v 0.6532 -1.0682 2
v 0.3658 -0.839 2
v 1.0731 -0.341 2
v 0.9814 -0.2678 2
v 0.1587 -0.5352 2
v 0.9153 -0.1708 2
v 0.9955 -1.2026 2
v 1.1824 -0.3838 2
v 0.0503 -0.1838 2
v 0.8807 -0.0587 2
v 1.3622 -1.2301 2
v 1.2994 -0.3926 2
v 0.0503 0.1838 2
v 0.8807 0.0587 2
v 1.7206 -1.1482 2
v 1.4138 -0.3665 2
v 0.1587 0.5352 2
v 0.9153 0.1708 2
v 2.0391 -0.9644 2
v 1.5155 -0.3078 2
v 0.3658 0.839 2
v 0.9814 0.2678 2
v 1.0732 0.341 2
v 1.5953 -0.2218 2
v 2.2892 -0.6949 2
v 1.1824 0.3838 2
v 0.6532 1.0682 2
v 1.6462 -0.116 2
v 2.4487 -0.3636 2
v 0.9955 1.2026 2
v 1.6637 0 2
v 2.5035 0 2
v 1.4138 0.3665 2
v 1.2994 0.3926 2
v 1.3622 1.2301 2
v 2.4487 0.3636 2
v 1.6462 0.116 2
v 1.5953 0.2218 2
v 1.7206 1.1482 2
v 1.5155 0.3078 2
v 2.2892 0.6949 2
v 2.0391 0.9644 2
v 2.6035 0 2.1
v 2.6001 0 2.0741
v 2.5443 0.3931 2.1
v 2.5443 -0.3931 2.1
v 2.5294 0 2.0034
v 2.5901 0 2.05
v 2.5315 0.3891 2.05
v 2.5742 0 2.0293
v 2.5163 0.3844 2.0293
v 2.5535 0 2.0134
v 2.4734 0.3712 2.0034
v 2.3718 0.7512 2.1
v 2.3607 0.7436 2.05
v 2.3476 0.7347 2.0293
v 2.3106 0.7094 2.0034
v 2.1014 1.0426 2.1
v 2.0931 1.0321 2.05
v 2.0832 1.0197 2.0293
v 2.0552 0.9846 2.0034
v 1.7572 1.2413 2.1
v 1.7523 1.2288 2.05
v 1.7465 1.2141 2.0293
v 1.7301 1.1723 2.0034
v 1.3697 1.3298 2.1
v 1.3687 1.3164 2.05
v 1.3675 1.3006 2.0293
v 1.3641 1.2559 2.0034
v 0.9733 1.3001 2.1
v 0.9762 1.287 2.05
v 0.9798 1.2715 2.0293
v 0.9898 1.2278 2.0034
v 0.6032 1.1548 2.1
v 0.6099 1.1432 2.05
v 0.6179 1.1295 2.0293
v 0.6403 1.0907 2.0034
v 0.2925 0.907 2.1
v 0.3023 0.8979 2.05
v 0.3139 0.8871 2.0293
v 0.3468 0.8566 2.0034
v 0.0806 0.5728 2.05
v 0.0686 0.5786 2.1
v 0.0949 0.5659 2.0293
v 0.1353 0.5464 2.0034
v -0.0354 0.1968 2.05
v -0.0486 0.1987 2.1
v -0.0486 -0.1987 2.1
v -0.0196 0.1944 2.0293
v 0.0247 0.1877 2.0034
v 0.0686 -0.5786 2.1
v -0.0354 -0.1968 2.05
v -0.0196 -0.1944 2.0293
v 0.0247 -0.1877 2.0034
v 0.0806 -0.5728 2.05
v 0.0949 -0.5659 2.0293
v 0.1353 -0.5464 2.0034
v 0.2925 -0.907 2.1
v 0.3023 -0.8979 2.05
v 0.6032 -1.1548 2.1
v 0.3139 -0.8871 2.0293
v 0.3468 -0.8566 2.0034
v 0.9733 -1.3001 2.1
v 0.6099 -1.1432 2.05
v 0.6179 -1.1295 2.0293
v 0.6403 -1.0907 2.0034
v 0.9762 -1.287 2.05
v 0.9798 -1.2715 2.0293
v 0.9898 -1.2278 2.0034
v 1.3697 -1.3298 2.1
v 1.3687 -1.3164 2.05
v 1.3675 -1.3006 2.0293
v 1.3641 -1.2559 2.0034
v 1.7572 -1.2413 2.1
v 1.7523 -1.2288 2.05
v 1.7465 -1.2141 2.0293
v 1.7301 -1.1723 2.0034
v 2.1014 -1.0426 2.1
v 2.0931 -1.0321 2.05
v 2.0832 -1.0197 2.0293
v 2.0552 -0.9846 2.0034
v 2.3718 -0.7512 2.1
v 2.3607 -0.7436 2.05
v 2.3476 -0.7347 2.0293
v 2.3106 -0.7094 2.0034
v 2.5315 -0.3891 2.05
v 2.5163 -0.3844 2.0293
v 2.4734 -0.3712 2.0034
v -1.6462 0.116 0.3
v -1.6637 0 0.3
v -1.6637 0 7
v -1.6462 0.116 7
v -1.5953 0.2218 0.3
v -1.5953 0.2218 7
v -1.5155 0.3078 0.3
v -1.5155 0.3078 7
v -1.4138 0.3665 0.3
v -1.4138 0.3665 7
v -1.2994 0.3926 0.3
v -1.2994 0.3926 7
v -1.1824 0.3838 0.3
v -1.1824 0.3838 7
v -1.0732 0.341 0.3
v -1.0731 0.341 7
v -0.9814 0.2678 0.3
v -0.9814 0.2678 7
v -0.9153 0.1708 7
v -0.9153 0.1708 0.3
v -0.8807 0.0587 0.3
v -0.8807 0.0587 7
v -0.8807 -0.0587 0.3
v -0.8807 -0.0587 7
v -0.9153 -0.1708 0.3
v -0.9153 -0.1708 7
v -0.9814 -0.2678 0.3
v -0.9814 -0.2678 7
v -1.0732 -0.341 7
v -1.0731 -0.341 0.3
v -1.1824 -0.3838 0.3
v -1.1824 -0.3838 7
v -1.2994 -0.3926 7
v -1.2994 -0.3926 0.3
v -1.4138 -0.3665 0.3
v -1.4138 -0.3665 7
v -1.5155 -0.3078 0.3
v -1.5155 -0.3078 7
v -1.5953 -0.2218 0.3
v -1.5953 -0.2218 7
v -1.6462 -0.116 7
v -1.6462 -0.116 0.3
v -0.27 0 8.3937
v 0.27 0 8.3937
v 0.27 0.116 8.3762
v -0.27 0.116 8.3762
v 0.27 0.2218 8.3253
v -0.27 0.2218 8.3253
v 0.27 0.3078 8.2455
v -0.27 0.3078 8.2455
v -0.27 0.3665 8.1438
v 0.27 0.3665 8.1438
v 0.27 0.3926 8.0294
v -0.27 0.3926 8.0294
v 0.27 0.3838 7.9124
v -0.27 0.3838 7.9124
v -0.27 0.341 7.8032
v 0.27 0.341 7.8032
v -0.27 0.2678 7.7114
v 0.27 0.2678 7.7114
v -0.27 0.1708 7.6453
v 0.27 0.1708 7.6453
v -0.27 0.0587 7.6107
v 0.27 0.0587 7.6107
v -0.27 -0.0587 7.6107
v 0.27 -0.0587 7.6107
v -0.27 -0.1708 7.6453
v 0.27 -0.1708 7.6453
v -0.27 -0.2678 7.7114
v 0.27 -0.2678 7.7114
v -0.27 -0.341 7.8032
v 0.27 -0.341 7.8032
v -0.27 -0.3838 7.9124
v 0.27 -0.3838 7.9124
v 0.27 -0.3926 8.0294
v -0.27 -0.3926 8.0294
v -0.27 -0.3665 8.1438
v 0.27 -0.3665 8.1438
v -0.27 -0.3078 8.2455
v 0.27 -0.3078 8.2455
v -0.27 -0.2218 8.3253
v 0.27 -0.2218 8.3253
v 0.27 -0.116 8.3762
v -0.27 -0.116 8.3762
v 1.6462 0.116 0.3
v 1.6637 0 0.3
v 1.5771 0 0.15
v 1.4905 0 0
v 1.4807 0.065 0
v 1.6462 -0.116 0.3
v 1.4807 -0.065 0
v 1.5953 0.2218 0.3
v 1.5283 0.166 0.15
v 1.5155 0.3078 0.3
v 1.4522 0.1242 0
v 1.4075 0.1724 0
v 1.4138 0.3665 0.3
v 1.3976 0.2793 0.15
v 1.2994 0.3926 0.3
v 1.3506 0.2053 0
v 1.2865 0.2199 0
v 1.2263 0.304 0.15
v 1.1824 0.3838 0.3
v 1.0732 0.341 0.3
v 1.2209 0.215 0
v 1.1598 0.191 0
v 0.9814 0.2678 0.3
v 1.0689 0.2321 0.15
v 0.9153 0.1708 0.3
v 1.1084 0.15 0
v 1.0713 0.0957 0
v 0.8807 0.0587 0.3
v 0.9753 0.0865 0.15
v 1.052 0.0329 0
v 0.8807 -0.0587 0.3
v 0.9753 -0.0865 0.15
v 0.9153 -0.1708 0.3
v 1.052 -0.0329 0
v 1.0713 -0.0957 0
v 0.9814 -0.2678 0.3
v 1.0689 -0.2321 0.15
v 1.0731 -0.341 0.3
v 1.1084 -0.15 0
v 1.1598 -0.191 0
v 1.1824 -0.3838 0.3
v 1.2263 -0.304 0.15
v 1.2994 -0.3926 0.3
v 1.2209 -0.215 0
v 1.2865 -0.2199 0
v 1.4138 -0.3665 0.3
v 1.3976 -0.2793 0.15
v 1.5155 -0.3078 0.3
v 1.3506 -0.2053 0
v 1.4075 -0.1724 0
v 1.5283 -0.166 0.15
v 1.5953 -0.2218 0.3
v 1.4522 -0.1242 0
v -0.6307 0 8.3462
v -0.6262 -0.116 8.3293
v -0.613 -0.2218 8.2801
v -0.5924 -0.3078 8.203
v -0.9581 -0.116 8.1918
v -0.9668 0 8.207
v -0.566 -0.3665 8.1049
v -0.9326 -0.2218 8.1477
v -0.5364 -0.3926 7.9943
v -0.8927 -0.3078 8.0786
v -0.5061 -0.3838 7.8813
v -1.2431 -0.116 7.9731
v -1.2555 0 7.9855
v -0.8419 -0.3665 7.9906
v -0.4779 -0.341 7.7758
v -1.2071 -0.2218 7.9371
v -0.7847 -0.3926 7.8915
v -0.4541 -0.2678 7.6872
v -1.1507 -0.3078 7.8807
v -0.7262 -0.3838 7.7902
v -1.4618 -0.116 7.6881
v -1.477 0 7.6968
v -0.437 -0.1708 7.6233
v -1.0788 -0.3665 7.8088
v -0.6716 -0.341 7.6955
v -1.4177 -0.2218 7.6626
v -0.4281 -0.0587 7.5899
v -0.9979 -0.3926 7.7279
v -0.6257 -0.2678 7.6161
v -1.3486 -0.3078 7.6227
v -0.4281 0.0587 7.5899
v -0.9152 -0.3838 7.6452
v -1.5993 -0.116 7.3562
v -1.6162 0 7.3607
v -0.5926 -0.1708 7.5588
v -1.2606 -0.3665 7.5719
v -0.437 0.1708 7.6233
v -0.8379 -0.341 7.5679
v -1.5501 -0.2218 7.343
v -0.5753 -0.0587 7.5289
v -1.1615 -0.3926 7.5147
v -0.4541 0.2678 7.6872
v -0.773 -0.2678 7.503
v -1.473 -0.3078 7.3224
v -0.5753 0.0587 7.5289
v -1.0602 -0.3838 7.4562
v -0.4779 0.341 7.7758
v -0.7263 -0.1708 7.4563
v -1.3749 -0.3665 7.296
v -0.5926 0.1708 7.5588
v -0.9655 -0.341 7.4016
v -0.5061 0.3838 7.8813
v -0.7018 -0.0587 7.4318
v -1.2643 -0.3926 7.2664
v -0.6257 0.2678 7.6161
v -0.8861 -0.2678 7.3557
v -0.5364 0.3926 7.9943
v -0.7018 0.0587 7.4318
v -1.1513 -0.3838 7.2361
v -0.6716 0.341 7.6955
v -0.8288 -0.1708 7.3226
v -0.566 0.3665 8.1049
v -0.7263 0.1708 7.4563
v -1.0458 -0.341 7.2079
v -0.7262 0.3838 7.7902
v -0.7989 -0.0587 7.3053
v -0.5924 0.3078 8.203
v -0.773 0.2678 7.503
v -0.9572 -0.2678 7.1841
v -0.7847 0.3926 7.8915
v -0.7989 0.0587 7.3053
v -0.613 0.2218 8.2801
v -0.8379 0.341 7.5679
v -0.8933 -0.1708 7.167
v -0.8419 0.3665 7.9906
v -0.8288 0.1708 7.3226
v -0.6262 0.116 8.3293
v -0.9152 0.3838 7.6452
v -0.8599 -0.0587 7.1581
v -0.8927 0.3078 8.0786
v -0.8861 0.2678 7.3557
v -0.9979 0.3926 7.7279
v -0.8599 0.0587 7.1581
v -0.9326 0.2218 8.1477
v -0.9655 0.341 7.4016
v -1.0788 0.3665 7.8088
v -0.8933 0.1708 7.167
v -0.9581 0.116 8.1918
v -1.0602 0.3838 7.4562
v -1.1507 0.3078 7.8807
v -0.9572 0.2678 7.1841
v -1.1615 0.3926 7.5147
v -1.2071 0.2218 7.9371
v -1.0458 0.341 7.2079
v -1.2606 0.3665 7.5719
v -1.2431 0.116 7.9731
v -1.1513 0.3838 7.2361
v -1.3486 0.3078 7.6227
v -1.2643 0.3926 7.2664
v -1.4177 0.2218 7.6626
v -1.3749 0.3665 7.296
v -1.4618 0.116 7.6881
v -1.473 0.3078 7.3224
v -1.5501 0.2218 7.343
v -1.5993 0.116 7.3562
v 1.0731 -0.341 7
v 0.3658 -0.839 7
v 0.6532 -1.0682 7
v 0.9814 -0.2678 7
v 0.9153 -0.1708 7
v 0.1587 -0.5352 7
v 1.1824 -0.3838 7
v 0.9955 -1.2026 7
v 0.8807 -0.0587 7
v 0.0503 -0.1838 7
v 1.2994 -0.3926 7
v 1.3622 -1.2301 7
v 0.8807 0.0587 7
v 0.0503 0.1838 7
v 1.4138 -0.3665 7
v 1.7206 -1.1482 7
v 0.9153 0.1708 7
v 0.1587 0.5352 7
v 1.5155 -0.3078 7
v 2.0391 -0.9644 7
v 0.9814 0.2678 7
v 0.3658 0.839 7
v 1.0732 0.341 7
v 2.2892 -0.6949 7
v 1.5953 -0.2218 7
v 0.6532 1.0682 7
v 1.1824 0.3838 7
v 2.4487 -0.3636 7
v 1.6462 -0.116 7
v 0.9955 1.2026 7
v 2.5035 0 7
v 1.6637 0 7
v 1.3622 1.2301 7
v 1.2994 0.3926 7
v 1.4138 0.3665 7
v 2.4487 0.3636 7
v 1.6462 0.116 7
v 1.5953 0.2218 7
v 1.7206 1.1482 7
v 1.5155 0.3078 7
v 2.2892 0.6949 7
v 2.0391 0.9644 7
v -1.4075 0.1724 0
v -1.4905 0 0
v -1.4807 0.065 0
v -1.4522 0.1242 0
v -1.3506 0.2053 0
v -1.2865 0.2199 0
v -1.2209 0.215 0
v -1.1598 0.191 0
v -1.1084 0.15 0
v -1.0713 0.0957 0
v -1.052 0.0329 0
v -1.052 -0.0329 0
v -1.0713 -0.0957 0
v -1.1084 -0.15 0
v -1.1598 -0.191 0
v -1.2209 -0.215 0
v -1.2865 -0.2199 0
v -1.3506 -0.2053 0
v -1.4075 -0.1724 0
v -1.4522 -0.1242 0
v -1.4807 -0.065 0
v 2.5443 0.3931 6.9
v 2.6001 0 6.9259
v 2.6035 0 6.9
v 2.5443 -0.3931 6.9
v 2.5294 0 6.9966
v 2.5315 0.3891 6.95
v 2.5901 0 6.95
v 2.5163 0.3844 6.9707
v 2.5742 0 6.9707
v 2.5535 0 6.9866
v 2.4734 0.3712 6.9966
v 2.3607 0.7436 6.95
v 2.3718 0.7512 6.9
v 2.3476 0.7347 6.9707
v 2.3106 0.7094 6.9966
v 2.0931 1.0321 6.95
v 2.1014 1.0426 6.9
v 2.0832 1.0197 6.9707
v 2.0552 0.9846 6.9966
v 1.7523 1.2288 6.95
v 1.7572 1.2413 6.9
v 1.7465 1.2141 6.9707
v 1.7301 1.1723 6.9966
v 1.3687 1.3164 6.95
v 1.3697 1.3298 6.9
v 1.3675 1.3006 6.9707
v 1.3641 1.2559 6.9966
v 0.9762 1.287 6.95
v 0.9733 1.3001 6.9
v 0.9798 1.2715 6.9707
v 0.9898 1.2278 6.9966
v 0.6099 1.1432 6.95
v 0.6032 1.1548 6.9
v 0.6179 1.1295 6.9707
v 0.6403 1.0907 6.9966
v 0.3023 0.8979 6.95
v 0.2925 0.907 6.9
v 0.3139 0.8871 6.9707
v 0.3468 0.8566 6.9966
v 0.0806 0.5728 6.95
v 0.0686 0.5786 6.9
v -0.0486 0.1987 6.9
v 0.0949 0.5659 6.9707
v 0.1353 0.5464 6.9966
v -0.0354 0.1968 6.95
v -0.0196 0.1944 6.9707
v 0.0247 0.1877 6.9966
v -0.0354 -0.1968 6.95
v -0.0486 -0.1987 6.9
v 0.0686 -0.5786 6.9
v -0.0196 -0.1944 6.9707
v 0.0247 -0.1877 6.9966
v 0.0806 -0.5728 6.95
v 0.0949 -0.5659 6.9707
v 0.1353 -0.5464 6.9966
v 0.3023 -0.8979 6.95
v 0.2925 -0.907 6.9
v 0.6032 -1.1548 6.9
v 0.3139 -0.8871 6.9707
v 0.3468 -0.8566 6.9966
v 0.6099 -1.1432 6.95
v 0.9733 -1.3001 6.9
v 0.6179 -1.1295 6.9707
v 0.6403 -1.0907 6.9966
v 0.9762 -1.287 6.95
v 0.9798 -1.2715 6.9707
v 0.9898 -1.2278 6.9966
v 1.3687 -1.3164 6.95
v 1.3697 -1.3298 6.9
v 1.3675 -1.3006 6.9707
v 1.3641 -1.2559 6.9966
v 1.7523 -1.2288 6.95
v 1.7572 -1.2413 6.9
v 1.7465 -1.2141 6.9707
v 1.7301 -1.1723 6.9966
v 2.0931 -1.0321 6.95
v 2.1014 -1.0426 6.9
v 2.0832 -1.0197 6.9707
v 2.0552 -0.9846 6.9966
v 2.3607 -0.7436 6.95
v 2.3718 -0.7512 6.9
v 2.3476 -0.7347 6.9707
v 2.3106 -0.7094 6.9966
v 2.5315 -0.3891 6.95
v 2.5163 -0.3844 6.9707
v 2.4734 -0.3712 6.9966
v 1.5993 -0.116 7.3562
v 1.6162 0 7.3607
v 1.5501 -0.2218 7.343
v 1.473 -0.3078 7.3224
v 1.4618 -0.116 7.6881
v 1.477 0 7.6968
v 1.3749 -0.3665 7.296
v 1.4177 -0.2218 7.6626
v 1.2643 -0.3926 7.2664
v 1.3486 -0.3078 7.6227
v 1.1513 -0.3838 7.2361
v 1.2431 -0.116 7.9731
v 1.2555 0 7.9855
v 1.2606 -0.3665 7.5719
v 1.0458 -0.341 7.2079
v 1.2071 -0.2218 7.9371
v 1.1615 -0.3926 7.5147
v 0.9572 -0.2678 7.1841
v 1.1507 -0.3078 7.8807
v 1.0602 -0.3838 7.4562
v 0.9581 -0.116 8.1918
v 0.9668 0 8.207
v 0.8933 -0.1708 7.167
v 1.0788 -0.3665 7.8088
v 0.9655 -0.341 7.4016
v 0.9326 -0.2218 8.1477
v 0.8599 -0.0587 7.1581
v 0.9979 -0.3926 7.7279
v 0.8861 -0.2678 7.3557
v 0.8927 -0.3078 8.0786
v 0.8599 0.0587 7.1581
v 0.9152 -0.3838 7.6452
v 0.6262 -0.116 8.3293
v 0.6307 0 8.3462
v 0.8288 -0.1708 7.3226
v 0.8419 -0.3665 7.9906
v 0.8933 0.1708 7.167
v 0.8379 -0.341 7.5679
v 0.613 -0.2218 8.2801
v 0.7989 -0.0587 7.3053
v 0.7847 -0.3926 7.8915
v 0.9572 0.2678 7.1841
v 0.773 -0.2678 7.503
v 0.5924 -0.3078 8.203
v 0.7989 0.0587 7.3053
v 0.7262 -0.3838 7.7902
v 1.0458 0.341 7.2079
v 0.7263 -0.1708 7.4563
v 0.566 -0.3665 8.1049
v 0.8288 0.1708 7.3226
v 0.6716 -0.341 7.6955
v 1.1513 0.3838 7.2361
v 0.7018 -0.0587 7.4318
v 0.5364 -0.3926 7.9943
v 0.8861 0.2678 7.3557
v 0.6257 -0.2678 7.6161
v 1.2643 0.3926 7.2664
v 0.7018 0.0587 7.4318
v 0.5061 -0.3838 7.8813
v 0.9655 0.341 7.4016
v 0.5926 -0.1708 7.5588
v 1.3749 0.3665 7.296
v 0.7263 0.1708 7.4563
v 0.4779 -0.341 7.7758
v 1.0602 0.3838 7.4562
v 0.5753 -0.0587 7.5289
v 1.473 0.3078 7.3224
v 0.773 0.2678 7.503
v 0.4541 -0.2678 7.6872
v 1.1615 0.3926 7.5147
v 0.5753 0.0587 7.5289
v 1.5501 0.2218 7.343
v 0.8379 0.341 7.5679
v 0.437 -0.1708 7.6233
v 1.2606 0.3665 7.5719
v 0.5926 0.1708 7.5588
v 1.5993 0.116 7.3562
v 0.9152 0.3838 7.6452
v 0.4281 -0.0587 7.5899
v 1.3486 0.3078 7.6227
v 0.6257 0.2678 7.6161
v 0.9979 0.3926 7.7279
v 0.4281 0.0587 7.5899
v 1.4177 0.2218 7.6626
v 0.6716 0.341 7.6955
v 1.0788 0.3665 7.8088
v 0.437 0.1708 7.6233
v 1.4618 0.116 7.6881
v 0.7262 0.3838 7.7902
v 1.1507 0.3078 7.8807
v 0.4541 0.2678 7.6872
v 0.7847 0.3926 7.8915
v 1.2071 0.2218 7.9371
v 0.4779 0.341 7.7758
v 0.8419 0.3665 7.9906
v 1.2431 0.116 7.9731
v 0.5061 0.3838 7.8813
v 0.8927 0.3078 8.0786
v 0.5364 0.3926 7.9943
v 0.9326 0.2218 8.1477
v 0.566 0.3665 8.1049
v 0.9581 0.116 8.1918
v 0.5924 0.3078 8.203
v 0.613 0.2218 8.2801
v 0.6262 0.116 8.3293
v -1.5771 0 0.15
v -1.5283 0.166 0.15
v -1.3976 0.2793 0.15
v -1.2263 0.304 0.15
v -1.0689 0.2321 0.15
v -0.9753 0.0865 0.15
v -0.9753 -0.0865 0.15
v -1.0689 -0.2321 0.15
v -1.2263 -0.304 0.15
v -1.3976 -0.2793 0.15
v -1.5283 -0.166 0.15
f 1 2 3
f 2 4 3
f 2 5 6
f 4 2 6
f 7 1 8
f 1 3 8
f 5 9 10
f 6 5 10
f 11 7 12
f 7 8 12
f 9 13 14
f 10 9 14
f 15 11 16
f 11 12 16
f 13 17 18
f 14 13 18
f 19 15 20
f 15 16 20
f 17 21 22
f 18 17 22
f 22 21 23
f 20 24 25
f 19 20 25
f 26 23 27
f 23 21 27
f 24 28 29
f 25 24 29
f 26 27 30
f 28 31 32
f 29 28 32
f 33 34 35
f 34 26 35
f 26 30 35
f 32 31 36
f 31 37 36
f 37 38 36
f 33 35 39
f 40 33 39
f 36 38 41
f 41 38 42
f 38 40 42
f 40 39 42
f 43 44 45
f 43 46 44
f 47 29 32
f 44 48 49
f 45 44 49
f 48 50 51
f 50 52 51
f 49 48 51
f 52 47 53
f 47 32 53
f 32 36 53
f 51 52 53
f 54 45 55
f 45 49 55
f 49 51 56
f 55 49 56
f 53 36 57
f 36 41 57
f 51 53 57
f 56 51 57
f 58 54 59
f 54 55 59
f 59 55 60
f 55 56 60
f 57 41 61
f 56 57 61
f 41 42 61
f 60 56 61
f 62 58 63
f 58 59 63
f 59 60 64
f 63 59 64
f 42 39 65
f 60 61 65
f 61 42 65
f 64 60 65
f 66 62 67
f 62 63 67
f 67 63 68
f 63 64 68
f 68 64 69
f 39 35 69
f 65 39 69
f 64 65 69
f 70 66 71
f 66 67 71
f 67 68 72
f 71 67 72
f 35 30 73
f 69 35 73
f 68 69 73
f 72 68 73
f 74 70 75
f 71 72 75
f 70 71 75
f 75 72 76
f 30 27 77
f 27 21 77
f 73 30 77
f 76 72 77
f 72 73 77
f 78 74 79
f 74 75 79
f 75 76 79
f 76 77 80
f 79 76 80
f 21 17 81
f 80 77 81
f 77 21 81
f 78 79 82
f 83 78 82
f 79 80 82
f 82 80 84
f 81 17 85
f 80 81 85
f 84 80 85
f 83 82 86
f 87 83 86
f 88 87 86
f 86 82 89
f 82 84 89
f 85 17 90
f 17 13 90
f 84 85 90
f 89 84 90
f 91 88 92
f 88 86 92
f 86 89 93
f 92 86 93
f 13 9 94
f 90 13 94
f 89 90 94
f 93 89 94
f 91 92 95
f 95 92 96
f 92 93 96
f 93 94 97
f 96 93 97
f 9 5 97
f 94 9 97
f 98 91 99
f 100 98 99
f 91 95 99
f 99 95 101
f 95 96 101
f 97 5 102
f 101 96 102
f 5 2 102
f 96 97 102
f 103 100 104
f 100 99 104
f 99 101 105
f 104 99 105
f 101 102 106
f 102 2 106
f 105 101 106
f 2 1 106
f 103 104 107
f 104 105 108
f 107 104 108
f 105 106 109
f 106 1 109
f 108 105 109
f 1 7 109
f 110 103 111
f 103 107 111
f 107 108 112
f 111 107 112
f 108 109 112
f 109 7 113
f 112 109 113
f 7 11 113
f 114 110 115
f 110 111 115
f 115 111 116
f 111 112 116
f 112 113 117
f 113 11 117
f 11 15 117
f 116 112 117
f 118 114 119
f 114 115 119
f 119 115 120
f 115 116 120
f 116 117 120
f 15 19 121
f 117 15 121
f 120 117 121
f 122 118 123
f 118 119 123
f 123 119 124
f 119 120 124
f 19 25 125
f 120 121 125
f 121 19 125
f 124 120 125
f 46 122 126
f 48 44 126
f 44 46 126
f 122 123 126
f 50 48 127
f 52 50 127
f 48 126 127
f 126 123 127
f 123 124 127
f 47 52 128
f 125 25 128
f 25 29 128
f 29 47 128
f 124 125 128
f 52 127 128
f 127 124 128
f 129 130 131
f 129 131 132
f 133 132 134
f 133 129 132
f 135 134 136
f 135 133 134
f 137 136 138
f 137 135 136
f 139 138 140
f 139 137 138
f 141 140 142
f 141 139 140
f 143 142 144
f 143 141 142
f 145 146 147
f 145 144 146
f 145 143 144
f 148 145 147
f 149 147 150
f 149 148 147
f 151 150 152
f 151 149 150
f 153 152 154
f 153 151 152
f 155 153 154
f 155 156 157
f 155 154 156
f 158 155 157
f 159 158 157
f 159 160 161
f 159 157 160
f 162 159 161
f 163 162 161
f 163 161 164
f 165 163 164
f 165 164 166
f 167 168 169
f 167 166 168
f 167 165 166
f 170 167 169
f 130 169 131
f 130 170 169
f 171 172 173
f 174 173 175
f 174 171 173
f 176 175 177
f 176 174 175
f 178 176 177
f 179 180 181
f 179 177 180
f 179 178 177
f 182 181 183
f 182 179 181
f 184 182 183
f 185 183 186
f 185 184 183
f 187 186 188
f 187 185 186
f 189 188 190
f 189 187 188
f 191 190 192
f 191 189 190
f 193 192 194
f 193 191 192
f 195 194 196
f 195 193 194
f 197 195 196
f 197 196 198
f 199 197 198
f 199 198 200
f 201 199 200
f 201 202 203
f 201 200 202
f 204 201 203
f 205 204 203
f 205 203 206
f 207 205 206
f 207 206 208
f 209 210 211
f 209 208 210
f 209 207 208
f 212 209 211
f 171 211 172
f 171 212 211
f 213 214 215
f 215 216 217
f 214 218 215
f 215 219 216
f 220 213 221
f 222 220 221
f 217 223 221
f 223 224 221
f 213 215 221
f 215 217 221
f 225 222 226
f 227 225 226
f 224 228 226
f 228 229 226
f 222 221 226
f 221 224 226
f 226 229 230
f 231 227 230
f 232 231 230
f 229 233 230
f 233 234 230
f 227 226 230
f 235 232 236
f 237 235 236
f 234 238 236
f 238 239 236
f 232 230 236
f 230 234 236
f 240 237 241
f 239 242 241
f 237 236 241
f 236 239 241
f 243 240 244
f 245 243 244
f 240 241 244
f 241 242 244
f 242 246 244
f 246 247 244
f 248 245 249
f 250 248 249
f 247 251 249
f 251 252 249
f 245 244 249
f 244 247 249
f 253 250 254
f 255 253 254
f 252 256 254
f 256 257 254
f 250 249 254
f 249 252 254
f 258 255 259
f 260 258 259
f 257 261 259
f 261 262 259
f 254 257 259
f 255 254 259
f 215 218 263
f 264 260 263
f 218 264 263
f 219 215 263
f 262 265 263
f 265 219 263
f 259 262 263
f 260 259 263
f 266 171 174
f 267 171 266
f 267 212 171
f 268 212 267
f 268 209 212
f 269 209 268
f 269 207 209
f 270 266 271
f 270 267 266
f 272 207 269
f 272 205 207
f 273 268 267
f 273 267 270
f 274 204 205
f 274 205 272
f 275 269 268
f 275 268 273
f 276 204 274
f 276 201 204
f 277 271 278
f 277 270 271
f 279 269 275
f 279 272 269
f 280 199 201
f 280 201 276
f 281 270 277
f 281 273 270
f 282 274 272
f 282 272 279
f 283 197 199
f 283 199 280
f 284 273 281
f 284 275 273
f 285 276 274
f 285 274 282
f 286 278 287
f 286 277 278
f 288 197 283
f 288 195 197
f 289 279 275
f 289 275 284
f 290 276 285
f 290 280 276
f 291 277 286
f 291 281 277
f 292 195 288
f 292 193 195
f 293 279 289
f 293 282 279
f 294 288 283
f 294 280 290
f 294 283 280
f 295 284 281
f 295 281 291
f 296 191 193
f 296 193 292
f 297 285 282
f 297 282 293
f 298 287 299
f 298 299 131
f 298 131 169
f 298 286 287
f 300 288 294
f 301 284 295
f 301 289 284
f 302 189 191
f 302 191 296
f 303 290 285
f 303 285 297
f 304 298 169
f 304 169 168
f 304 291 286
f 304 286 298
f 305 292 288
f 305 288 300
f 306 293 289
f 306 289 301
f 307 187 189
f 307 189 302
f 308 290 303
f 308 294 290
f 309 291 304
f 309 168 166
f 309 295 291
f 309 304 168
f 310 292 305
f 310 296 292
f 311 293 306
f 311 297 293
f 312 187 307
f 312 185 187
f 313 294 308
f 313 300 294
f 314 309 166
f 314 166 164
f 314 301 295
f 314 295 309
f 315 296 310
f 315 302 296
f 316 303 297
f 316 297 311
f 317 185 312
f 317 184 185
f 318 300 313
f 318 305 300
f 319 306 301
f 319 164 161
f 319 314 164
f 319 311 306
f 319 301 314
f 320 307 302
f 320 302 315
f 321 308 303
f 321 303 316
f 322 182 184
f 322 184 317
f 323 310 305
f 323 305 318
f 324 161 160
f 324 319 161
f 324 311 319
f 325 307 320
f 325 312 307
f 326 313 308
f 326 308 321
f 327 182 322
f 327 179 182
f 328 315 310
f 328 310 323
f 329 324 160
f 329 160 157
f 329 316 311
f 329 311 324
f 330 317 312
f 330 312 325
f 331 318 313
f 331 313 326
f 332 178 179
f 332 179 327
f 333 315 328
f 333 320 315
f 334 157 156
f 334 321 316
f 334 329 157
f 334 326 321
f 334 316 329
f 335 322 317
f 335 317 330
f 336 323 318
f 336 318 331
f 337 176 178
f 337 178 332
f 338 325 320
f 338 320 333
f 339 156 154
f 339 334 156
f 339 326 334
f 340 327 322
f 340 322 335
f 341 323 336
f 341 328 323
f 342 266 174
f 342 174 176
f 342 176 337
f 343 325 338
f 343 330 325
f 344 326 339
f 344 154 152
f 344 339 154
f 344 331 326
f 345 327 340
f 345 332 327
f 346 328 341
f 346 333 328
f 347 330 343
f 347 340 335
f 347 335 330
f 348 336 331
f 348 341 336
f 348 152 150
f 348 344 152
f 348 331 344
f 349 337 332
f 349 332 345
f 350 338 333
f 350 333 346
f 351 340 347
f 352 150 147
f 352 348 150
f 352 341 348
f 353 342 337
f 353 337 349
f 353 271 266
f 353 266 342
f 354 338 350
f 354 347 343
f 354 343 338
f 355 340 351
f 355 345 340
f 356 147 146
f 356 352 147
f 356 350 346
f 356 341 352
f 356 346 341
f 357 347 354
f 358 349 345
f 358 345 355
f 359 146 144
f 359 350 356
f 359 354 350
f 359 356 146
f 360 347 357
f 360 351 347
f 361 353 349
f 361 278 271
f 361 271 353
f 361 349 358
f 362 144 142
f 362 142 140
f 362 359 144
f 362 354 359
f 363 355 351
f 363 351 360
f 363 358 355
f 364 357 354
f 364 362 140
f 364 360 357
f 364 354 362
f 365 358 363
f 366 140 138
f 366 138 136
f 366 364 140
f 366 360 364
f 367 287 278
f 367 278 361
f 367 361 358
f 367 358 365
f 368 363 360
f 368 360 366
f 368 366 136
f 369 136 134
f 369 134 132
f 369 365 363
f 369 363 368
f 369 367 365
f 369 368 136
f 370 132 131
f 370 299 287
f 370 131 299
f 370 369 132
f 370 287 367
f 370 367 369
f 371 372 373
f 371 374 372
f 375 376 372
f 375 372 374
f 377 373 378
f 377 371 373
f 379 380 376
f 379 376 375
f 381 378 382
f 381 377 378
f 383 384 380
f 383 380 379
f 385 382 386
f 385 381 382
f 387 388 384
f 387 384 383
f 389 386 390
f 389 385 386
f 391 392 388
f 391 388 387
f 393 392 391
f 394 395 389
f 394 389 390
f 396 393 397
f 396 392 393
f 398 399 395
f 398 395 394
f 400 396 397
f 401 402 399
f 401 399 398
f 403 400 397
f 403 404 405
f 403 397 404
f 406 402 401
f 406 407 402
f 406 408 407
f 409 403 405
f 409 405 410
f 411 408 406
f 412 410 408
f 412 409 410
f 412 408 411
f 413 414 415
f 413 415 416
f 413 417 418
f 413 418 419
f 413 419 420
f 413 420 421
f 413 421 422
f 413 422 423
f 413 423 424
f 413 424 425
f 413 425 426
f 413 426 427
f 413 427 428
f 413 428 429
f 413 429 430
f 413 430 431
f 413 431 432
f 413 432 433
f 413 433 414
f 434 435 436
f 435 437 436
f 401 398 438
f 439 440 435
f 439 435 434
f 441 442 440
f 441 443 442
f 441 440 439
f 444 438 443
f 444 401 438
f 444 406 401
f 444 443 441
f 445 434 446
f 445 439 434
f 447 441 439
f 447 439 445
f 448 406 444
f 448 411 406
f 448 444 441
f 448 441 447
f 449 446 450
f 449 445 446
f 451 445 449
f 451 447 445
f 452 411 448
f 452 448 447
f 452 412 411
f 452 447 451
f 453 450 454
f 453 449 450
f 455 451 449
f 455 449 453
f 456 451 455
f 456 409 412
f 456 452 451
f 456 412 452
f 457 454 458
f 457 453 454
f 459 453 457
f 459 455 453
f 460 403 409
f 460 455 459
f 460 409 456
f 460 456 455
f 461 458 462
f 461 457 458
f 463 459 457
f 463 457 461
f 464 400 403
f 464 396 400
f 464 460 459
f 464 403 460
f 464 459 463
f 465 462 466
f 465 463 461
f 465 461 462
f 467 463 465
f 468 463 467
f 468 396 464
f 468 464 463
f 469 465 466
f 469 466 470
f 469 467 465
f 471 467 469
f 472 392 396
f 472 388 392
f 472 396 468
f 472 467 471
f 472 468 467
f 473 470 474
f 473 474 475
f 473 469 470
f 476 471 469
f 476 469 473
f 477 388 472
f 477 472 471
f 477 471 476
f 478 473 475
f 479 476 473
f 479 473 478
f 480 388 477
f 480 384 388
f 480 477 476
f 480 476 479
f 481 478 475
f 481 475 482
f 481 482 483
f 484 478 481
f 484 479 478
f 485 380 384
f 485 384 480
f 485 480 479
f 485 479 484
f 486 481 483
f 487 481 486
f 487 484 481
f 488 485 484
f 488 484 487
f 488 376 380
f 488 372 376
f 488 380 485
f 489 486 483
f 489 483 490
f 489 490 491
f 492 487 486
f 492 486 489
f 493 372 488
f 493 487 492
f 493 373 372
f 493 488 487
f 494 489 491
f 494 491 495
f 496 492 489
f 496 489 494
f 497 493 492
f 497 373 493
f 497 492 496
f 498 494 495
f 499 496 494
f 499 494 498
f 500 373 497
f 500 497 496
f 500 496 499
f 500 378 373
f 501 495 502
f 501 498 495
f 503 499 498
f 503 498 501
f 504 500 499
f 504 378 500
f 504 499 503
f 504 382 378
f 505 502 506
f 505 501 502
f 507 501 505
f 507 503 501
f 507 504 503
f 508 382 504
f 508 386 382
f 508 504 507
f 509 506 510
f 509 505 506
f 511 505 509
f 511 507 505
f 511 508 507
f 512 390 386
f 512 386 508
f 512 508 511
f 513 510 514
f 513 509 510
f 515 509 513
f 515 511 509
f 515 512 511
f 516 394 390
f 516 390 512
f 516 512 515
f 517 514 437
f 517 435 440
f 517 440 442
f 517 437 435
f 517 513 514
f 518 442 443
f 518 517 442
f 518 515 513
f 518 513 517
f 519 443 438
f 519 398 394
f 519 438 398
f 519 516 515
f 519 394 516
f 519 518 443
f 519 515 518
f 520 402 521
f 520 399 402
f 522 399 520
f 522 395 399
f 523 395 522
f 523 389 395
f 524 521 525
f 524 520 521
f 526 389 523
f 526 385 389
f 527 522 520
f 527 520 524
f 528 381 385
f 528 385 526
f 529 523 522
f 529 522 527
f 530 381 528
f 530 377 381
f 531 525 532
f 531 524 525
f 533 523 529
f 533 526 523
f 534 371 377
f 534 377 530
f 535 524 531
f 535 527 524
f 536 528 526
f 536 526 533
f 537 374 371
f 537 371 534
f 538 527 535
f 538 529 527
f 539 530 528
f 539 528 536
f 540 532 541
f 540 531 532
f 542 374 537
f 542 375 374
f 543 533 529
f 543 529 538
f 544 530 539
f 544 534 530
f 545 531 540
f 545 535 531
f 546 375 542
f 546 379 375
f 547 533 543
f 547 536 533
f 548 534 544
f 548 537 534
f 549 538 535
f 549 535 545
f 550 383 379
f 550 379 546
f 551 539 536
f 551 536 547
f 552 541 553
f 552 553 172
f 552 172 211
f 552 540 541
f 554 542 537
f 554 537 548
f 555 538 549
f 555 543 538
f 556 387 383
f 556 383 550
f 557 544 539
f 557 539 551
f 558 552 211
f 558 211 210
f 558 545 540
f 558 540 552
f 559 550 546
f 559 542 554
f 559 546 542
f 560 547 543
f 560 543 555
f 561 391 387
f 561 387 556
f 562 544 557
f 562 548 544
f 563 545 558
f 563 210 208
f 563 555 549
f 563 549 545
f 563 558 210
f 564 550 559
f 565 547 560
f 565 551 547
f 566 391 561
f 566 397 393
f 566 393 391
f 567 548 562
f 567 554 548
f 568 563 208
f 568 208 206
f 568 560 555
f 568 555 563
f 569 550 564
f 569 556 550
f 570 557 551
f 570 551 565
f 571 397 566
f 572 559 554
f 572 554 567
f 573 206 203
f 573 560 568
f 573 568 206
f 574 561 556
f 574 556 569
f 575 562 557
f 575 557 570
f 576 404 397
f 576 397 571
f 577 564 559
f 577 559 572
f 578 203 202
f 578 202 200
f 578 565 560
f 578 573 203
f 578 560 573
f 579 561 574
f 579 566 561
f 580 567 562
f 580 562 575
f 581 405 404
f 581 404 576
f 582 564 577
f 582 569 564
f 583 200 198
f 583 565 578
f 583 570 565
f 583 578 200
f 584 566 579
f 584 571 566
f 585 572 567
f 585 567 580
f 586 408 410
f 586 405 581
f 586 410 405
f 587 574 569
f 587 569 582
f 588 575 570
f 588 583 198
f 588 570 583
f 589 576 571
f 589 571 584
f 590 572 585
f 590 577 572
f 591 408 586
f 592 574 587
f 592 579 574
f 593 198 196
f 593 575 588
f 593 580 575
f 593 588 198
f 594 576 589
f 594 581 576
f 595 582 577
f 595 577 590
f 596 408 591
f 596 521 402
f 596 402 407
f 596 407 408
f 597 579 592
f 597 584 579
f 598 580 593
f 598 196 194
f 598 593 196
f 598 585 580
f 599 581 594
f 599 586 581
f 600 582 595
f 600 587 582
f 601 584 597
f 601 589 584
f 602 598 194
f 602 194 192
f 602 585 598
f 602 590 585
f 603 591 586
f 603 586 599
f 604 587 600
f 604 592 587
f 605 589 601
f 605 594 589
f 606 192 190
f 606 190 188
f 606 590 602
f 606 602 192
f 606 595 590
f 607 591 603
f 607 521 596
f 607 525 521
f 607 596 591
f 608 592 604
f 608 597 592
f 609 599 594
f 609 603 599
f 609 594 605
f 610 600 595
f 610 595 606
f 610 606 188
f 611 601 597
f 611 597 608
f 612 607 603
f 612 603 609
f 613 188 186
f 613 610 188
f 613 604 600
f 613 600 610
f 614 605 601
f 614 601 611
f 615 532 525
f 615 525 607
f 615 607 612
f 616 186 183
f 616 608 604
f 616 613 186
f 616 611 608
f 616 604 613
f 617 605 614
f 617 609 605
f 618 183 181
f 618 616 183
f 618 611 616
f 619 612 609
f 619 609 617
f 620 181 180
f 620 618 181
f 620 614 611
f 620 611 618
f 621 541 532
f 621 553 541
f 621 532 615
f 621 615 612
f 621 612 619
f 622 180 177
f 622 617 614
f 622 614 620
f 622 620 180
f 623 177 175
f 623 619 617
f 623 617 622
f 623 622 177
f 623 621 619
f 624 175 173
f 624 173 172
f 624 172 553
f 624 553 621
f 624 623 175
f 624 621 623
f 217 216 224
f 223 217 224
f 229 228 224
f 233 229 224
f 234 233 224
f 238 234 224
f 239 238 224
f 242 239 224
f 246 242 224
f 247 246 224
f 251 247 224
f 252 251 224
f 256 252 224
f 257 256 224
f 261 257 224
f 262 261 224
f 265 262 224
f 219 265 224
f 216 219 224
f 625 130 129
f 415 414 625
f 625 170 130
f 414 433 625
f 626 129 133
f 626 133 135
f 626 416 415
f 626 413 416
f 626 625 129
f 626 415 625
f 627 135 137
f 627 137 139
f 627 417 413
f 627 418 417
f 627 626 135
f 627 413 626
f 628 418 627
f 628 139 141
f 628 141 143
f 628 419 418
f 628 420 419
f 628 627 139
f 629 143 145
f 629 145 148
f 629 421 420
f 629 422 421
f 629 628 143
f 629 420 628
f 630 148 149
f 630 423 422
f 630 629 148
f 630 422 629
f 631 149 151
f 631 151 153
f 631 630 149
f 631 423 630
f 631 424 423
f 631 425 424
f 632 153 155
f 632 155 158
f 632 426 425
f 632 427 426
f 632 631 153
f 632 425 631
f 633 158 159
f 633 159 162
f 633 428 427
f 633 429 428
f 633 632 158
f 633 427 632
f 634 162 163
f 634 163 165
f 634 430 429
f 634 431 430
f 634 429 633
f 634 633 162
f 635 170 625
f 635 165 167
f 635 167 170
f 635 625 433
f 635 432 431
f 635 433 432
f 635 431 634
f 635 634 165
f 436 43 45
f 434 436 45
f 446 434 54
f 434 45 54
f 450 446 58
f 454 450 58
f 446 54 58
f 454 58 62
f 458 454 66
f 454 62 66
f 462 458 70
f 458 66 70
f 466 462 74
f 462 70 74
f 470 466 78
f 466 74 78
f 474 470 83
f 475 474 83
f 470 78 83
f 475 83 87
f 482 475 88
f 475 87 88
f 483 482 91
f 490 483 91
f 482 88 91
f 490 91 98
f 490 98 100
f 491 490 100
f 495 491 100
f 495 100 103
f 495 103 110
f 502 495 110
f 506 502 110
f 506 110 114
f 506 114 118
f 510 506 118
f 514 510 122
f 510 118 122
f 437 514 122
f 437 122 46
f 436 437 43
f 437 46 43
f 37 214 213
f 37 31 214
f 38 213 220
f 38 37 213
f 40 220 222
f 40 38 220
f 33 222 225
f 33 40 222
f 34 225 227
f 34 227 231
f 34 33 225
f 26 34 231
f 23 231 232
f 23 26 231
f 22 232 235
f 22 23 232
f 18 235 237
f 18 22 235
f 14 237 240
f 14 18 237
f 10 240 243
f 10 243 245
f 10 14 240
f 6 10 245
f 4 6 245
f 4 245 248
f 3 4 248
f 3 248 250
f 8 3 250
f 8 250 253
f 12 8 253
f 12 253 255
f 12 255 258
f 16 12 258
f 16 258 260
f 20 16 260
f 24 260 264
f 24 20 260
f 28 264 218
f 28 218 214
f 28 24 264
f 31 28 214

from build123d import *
from OCP.BRepFilletAPI import BRepFilletAPI_MakeChamfer

# Parameters (mm, degrees)
SKETCH1_R      = 0.3937
CHAMFER1_SIZE  = 0.3
CHAMFER1_SIZE2 = 0.173205081
SKETCH4_R      = 1.3335
EXTRUDE2_DEPTH = 5
FILLET2_R      = 0.1


with BuildPart() as part:
    # Sweep1: sweep along a path in Sketch3
    with BuildLine(Plane(origin=(0, 0, 0), x_dir=(1, 0, 0), z_dir=(0, 1, 0))) as sweep1_path:
        Line((1.27, 0), (1.27, -7))
        ThreePointArc((1.27, -7), (0.977106781, -7.707106781), (0.27, -8))
        Line((0.27, -8), (-0.27, -8))
        ThreePointArc((-0.27, -8), (-0.977106781, -7.707106781), (-1.27, -7))
        Line((-1.27, -7), (-1.27, 0))
    # Sketch1 → Sweep1 (sweep)
    with BuildSketch(Plane.XY):
        with Locations((1.27, 0)):
            Circle(SKETCH1_R)
    sweep(path=sweep1_path.line)

    # Chamfer1: one chamfer whose edges measure the first distance from different faces: ONE call of the kernel's chamfer builder (chamfer() names one face for all edges)
    chamfer1_edges_1 = [part.edges().sort_by_distance(p)[0] for p in [
        (0.8763, 0, 0),
    ]]
    chamfer1_side_1 = [part.faces().sort_by_distance(p)[0] for p in [
        (0.8763, 0, 3.5),
    ]]
    chamfer1_edges_2 = [part.edges().sort_by_distance(p)[0] for p in [
        (-0.8763, 0, 0),
    ]]
    chamfer1_side_2 = [part.faces().sort_by_distance(p)[0] for p in [
        (-0.8763, 0, 3.5),
    ]]
    chamfer1 = BRepFilletAPI_MakeChamfer(part.part.solid().wrapped)
    for e in chamfer1_edges_1:
        chamfer1.Add(CHAMFER1_SIZE, CHAMFER1_SIZE2, e.wrapped, chamfer1_side_1[0].wrapped)  # the first distance lies on this face
    for e in chamfer1_edges_2:
        chamfer1.Add(CHAMFER1_SIZE, CHAMFER1_SIZE2, e.wrapped, chamfer1_side_2[0].wrapped)  # the first distance lies on this face
    add(Compound.cast(chamfer1.Shape()), mode=Mode.REPLACE)

    # Sketch4 → Extrude2 (add)
    with BuildSketch(Plane.XY.offset(2)):
        with Locations((1.27, 0)):
            Circle(SKETCH4_R)
    extrude(amount=EXTRUDE2_DEPTH)

    # Fillet2
    fillet2_edges = [part.edges().sort_by_distance(p)[0] for p in [
        (-0.0635, 0, 7),
        (-0.0635, 0, 2),
    ]]
    fillet(fillet2_edges, radius=FILLET2_R)


solid = part.part
